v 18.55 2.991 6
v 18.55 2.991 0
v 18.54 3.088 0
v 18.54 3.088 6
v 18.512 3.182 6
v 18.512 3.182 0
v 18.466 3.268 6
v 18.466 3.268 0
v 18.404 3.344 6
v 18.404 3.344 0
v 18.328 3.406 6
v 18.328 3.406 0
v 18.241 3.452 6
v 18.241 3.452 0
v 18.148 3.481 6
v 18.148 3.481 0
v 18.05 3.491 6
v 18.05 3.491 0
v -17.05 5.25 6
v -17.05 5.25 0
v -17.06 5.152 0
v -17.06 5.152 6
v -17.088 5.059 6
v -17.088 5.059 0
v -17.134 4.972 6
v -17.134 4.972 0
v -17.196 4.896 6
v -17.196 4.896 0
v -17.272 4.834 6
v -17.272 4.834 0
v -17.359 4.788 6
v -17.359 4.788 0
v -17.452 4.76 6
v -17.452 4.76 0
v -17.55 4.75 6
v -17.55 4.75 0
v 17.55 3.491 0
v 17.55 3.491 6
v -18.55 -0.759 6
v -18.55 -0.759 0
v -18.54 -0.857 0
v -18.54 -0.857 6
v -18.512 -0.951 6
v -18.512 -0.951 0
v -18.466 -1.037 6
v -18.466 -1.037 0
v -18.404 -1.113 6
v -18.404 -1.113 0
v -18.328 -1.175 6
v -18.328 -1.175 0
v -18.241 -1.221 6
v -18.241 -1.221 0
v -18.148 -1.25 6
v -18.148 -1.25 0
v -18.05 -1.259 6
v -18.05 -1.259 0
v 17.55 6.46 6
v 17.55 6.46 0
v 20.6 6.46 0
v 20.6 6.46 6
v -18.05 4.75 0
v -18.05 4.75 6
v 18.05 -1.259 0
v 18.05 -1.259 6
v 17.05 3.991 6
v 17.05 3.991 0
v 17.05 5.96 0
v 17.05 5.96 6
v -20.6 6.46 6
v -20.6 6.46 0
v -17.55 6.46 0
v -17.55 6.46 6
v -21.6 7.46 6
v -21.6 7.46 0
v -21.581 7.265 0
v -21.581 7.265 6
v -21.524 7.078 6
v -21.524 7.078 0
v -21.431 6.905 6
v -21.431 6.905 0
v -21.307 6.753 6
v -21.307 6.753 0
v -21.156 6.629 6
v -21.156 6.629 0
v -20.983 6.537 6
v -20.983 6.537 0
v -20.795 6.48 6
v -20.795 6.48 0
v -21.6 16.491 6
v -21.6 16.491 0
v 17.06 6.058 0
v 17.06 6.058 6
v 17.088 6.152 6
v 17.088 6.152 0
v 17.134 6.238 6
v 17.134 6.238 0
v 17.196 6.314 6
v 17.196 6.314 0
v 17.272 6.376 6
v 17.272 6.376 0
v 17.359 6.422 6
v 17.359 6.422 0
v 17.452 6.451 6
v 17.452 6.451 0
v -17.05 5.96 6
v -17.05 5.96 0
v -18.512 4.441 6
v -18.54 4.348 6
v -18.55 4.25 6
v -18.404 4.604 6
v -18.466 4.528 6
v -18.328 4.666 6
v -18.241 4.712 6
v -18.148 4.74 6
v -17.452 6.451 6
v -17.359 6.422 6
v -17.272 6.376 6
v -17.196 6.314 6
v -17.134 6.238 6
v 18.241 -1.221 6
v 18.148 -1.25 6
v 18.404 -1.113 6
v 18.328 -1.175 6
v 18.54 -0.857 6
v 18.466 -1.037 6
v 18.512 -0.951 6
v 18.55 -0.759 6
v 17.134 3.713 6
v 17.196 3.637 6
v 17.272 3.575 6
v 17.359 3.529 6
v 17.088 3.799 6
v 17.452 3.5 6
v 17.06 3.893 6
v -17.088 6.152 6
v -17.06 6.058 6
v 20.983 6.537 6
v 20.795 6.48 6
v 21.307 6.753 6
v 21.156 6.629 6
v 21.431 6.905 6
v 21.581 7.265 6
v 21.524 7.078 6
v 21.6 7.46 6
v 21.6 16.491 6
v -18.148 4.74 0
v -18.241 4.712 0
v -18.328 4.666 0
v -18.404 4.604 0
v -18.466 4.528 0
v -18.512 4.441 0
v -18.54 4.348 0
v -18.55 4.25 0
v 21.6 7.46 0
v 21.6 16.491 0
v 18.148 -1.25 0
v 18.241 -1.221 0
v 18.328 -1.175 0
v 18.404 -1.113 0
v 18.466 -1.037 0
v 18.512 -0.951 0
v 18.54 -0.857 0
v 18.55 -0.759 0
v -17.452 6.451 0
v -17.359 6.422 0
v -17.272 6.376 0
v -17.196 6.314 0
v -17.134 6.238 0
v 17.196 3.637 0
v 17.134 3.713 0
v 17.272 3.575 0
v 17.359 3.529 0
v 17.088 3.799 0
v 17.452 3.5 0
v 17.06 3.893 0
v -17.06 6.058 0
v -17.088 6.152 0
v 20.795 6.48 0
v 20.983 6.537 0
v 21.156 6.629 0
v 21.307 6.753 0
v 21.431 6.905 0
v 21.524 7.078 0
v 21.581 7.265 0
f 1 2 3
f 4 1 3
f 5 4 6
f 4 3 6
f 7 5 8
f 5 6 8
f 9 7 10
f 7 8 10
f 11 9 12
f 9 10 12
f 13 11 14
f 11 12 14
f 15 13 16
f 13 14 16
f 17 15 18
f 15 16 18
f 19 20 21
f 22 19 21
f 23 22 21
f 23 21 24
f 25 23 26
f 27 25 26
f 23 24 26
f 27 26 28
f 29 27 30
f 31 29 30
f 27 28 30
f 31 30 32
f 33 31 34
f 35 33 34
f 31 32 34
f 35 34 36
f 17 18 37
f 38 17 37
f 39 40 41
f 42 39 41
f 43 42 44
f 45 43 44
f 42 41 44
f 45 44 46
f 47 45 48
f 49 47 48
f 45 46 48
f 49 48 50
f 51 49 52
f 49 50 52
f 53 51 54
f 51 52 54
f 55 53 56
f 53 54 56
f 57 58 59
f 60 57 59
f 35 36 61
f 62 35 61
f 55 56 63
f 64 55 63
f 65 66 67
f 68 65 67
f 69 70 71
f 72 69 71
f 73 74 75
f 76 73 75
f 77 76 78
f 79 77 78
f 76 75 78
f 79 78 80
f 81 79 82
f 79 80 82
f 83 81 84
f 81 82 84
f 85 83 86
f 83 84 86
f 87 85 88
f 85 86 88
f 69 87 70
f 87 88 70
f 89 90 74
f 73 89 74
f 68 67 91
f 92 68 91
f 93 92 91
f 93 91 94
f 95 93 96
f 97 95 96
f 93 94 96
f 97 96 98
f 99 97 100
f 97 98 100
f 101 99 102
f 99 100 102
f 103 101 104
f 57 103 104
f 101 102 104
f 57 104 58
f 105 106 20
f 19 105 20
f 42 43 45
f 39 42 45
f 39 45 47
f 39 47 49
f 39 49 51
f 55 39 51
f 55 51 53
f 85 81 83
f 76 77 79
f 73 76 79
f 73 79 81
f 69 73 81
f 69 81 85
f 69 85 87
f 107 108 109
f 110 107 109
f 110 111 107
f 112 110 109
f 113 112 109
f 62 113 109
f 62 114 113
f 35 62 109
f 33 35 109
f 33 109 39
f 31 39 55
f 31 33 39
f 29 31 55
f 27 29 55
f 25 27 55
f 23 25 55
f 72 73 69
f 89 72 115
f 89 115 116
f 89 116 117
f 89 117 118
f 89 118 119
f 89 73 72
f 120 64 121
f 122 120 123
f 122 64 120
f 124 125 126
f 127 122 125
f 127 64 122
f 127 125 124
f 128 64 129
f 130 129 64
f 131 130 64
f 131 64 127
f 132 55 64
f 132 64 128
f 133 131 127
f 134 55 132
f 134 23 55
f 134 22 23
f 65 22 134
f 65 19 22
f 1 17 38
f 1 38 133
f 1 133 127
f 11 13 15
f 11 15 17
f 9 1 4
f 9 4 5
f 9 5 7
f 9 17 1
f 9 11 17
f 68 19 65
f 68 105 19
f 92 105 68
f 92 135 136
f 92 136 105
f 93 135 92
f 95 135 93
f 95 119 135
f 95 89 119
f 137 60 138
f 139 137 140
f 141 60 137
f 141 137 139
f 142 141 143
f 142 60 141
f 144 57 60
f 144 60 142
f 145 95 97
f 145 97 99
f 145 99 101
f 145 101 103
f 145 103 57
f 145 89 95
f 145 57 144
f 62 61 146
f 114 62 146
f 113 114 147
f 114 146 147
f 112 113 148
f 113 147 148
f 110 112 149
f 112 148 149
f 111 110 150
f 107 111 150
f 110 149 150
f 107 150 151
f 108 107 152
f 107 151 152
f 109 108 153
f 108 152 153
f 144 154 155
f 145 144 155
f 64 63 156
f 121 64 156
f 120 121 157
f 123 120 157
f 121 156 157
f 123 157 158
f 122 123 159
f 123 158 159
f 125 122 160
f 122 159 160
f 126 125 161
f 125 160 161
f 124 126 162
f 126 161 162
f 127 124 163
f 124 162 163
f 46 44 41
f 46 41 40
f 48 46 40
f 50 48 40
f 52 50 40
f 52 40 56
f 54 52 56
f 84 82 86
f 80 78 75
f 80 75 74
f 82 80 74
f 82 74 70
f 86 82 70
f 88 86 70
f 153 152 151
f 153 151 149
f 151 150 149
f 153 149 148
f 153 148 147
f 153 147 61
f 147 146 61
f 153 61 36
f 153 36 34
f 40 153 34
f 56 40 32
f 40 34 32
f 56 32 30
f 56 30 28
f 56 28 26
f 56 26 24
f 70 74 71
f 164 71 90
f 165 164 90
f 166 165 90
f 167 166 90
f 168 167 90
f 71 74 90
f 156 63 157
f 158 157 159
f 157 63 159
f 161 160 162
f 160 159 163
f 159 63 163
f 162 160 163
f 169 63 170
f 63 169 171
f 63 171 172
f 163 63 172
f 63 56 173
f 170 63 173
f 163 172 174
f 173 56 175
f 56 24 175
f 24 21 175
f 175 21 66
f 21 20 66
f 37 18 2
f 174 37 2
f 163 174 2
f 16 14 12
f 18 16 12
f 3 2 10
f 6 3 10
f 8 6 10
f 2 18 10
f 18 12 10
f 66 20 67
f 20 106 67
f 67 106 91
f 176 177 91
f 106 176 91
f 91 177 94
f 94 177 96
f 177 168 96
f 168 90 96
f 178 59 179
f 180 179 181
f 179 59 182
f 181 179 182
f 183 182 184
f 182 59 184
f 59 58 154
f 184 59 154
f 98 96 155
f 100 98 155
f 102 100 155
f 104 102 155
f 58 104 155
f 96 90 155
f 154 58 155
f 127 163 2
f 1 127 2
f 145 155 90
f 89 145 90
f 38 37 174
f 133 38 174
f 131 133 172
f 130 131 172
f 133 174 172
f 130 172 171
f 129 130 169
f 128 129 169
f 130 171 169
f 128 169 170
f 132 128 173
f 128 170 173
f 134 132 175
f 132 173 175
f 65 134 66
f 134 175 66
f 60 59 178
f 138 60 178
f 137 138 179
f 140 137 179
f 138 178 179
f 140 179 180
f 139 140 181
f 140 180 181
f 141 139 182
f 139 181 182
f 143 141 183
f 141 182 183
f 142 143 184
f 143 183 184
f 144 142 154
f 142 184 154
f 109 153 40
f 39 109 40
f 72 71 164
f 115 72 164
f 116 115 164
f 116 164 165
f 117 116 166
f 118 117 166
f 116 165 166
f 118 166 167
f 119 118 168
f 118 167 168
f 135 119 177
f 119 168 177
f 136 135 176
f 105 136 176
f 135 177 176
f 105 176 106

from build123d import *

# Parameters (mm, degrees)
BOSS_EXTRUDE1_DEPTH = 6


with BuildPart() as part:
    # Sketch6 → Boss-Extrude1 (new body)
    with BuildSketch(Plane.XY):
        with BuildLine():
            Line((-18.05, -1.259488518), (18.05, -1.259488518))
            ThreePointArc((18.05, -1.259488518), (18.403553391, -1.113041908), (18.55, -0.759488518))
            Line((18.55, -0.759488518), (18.55, 2.990511482))
            ThreePointArc((18.55, 2.990511482), (18.403553391, 3.344064873), (18.05, 3.490511482))
            Line((18.05, 3.490511482), (17.55, 3.490511482))
            ThreePointArc((17.55, 3.490511482), (17.196446609, 3.636958092), (17.05, 3.990511482))
            Line((17.05, 3.990511482), (17.05, 5.960429817))
            ThreePointArc((17.05, 5.960429817), (17.196446609, 6.313983207), (17.55, 6.460429817))
            Line((17.55, 6.460429817), (20.6, 6.460429817))
            ThreePointArc((20.6, 6.460429817), (21.307106781, 6.753323035), (21.6, 7.460429817))
            Line((21.6, 7.460429817), (21.6, 16.490511482))
            Line((21.6, 16.490511482), (-21.6, 16.490511482))
            Line((-21.6, 16.490511482), (-21.6, 7.460429817))
            ThreePointArc((-21.6, 7.460429817), (-21.307106781, 6.753323035), (-20.6, 6.460429817))
            Line((-20.6, 6.460429817), (-17.55, 6.460429817))
            ThreePointArc((-17.55, 6.460429817), (-17.196446609, 6.313983207), (-17.05, 5.960429817))
            Line((-17.05, 5.960429817), (-17.05, 5.25))
            ThreePointArc((-17.05, 5.25), (-17.196446609, 4.896446609), (-17.55, 4.75))
            Line((-17.55, 4.75), (-18.05, 4.75))
            ThreePointArc((-18.05, 4.75), (-18.403553391, 4.603553391), (-18.55, 4.25))
            Line((-18.55, 4.25), (-18.55, -0.759488518))
            ThreePointArc((-18.55, -0.759488518), (-18.403553391, -1.113041908), (-18.05, -1.259488518))
        make_face()
    extrude(amount=BOSS_EXTRUDE1_DEPTH)


solid = part.part
